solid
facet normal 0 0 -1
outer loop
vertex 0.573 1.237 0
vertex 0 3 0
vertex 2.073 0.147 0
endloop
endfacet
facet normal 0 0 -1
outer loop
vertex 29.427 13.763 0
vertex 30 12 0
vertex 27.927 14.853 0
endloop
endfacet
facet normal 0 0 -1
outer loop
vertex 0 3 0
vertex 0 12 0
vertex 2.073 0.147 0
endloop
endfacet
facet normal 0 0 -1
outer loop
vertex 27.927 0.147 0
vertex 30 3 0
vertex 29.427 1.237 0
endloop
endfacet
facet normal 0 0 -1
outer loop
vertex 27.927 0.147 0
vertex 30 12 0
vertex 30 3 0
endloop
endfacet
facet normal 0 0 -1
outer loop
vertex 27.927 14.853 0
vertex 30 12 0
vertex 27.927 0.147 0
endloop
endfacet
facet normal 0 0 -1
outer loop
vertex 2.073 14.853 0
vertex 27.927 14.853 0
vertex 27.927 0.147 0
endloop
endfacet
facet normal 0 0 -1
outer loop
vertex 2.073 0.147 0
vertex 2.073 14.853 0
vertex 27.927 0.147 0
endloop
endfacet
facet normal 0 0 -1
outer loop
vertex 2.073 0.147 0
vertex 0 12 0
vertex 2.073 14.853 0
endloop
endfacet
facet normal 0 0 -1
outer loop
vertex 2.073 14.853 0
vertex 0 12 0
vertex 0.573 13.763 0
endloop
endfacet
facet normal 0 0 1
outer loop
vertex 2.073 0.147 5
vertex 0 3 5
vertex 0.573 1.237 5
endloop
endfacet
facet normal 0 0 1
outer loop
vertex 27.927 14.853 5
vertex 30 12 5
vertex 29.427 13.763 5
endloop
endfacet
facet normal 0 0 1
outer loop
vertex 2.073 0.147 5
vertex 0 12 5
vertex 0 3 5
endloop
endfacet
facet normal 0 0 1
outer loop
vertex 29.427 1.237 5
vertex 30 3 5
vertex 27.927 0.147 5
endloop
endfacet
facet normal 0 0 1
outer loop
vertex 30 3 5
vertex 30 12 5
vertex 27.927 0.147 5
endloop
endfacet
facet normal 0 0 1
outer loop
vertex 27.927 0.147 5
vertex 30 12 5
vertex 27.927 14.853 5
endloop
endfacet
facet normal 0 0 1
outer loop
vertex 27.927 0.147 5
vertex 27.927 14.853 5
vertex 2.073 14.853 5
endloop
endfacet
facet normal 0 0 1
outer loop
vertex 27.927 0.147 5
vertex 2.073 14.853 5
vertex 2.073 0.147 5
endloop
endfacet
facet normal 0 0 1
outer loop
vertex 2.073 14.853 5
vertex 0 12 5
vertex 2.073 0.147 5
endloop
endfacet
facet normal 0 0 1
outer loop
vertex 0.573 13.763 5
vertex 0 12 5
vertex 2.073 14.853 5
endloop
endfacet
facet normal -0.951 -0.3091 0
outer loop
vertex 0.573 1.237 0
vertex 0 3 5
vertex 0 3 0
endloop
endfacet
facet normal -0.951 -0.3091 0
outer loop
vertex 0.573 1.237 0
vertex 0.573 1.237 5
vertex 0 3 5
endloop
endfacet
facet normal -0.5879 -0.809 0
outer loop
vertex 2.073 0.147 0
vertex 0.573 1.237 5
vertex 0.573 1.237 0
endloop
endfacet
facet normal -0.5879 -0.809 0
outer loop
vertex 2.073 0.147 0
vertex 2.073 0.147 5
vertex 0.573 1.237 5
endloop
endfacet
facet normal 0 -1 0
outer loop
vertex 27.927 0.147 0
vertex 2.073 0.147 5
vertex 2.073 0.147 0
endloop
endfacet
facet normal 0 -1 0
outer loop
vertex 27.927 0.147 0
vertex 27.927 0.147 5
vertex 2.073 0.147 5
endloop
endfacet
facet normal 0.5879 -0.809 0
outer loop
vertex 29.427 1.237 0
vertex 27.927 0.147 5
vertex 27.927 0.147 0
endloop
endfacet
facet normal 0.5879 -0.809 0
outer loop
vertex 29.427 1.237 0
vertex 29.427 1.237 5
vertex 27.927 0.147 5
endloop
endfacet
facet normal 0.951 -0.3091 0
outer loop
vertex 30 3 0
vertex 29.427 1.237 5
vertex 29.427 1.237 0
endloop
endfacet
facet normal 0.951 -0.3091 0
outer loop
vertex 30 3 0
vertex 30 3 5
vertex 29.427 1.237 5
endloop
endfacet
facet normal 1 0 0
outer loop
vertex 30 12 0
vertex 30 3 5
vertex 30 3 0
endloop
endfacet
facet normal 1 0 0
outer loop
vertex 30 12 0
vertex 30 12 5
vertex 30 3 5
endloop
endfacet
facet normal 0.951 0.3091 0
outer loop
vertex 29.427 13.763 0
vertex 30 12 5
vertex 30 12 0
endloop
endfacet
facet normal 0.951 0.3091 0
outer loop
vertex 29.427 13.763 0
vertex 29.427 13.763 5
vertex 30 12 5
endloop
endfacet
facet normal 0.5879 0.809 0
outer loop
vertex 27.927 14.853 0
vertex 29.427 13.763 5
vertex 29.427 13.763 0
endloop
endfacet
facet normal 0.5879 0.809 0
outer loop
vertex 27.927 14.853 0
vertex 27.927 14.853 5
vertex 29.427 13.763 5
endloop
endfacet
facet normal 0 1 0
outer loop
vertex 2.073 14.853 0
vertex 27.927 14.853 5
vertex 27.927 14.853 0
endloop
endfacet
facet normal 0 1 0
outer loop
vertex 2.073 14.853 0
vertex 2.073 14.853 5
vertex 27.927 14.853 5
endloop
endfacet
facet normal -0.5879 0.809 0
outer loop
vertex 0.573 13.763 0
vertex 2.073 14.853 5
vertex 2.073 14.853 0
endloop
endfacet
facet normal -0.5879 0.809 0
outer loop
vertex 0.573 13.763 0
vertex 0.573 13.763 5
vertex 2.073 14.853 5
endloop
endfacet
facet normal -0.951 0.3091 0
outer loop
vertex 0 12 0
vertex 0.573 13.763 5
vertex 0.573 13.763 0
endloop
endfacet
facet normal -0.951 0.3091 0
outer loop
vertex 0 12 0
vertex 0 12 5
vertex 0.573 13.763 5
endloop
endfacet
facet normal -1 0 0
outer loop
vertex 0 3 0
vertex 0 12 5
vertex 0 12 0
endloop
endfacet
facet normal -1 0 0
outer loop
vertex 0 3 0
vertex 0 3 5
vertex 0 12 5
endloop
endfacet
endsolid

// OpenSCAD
// Rounded rectangle using hull
module rounded_rect(size = [20, 10], r = 2) {
    hull() {
        translate([r, r, 0]) circle(r = r);
        translate([size[0] - r, r, 0]) circle(r = r);
        translate([size[0] - r, size[1] - r, 0]) circle(r = r);
        translate([r, size[1] - r, 0]) circle(r = r);
    }
}

linear_extrude(height = 5)
    rounded_rect(size = [30, 15], r = 3);
